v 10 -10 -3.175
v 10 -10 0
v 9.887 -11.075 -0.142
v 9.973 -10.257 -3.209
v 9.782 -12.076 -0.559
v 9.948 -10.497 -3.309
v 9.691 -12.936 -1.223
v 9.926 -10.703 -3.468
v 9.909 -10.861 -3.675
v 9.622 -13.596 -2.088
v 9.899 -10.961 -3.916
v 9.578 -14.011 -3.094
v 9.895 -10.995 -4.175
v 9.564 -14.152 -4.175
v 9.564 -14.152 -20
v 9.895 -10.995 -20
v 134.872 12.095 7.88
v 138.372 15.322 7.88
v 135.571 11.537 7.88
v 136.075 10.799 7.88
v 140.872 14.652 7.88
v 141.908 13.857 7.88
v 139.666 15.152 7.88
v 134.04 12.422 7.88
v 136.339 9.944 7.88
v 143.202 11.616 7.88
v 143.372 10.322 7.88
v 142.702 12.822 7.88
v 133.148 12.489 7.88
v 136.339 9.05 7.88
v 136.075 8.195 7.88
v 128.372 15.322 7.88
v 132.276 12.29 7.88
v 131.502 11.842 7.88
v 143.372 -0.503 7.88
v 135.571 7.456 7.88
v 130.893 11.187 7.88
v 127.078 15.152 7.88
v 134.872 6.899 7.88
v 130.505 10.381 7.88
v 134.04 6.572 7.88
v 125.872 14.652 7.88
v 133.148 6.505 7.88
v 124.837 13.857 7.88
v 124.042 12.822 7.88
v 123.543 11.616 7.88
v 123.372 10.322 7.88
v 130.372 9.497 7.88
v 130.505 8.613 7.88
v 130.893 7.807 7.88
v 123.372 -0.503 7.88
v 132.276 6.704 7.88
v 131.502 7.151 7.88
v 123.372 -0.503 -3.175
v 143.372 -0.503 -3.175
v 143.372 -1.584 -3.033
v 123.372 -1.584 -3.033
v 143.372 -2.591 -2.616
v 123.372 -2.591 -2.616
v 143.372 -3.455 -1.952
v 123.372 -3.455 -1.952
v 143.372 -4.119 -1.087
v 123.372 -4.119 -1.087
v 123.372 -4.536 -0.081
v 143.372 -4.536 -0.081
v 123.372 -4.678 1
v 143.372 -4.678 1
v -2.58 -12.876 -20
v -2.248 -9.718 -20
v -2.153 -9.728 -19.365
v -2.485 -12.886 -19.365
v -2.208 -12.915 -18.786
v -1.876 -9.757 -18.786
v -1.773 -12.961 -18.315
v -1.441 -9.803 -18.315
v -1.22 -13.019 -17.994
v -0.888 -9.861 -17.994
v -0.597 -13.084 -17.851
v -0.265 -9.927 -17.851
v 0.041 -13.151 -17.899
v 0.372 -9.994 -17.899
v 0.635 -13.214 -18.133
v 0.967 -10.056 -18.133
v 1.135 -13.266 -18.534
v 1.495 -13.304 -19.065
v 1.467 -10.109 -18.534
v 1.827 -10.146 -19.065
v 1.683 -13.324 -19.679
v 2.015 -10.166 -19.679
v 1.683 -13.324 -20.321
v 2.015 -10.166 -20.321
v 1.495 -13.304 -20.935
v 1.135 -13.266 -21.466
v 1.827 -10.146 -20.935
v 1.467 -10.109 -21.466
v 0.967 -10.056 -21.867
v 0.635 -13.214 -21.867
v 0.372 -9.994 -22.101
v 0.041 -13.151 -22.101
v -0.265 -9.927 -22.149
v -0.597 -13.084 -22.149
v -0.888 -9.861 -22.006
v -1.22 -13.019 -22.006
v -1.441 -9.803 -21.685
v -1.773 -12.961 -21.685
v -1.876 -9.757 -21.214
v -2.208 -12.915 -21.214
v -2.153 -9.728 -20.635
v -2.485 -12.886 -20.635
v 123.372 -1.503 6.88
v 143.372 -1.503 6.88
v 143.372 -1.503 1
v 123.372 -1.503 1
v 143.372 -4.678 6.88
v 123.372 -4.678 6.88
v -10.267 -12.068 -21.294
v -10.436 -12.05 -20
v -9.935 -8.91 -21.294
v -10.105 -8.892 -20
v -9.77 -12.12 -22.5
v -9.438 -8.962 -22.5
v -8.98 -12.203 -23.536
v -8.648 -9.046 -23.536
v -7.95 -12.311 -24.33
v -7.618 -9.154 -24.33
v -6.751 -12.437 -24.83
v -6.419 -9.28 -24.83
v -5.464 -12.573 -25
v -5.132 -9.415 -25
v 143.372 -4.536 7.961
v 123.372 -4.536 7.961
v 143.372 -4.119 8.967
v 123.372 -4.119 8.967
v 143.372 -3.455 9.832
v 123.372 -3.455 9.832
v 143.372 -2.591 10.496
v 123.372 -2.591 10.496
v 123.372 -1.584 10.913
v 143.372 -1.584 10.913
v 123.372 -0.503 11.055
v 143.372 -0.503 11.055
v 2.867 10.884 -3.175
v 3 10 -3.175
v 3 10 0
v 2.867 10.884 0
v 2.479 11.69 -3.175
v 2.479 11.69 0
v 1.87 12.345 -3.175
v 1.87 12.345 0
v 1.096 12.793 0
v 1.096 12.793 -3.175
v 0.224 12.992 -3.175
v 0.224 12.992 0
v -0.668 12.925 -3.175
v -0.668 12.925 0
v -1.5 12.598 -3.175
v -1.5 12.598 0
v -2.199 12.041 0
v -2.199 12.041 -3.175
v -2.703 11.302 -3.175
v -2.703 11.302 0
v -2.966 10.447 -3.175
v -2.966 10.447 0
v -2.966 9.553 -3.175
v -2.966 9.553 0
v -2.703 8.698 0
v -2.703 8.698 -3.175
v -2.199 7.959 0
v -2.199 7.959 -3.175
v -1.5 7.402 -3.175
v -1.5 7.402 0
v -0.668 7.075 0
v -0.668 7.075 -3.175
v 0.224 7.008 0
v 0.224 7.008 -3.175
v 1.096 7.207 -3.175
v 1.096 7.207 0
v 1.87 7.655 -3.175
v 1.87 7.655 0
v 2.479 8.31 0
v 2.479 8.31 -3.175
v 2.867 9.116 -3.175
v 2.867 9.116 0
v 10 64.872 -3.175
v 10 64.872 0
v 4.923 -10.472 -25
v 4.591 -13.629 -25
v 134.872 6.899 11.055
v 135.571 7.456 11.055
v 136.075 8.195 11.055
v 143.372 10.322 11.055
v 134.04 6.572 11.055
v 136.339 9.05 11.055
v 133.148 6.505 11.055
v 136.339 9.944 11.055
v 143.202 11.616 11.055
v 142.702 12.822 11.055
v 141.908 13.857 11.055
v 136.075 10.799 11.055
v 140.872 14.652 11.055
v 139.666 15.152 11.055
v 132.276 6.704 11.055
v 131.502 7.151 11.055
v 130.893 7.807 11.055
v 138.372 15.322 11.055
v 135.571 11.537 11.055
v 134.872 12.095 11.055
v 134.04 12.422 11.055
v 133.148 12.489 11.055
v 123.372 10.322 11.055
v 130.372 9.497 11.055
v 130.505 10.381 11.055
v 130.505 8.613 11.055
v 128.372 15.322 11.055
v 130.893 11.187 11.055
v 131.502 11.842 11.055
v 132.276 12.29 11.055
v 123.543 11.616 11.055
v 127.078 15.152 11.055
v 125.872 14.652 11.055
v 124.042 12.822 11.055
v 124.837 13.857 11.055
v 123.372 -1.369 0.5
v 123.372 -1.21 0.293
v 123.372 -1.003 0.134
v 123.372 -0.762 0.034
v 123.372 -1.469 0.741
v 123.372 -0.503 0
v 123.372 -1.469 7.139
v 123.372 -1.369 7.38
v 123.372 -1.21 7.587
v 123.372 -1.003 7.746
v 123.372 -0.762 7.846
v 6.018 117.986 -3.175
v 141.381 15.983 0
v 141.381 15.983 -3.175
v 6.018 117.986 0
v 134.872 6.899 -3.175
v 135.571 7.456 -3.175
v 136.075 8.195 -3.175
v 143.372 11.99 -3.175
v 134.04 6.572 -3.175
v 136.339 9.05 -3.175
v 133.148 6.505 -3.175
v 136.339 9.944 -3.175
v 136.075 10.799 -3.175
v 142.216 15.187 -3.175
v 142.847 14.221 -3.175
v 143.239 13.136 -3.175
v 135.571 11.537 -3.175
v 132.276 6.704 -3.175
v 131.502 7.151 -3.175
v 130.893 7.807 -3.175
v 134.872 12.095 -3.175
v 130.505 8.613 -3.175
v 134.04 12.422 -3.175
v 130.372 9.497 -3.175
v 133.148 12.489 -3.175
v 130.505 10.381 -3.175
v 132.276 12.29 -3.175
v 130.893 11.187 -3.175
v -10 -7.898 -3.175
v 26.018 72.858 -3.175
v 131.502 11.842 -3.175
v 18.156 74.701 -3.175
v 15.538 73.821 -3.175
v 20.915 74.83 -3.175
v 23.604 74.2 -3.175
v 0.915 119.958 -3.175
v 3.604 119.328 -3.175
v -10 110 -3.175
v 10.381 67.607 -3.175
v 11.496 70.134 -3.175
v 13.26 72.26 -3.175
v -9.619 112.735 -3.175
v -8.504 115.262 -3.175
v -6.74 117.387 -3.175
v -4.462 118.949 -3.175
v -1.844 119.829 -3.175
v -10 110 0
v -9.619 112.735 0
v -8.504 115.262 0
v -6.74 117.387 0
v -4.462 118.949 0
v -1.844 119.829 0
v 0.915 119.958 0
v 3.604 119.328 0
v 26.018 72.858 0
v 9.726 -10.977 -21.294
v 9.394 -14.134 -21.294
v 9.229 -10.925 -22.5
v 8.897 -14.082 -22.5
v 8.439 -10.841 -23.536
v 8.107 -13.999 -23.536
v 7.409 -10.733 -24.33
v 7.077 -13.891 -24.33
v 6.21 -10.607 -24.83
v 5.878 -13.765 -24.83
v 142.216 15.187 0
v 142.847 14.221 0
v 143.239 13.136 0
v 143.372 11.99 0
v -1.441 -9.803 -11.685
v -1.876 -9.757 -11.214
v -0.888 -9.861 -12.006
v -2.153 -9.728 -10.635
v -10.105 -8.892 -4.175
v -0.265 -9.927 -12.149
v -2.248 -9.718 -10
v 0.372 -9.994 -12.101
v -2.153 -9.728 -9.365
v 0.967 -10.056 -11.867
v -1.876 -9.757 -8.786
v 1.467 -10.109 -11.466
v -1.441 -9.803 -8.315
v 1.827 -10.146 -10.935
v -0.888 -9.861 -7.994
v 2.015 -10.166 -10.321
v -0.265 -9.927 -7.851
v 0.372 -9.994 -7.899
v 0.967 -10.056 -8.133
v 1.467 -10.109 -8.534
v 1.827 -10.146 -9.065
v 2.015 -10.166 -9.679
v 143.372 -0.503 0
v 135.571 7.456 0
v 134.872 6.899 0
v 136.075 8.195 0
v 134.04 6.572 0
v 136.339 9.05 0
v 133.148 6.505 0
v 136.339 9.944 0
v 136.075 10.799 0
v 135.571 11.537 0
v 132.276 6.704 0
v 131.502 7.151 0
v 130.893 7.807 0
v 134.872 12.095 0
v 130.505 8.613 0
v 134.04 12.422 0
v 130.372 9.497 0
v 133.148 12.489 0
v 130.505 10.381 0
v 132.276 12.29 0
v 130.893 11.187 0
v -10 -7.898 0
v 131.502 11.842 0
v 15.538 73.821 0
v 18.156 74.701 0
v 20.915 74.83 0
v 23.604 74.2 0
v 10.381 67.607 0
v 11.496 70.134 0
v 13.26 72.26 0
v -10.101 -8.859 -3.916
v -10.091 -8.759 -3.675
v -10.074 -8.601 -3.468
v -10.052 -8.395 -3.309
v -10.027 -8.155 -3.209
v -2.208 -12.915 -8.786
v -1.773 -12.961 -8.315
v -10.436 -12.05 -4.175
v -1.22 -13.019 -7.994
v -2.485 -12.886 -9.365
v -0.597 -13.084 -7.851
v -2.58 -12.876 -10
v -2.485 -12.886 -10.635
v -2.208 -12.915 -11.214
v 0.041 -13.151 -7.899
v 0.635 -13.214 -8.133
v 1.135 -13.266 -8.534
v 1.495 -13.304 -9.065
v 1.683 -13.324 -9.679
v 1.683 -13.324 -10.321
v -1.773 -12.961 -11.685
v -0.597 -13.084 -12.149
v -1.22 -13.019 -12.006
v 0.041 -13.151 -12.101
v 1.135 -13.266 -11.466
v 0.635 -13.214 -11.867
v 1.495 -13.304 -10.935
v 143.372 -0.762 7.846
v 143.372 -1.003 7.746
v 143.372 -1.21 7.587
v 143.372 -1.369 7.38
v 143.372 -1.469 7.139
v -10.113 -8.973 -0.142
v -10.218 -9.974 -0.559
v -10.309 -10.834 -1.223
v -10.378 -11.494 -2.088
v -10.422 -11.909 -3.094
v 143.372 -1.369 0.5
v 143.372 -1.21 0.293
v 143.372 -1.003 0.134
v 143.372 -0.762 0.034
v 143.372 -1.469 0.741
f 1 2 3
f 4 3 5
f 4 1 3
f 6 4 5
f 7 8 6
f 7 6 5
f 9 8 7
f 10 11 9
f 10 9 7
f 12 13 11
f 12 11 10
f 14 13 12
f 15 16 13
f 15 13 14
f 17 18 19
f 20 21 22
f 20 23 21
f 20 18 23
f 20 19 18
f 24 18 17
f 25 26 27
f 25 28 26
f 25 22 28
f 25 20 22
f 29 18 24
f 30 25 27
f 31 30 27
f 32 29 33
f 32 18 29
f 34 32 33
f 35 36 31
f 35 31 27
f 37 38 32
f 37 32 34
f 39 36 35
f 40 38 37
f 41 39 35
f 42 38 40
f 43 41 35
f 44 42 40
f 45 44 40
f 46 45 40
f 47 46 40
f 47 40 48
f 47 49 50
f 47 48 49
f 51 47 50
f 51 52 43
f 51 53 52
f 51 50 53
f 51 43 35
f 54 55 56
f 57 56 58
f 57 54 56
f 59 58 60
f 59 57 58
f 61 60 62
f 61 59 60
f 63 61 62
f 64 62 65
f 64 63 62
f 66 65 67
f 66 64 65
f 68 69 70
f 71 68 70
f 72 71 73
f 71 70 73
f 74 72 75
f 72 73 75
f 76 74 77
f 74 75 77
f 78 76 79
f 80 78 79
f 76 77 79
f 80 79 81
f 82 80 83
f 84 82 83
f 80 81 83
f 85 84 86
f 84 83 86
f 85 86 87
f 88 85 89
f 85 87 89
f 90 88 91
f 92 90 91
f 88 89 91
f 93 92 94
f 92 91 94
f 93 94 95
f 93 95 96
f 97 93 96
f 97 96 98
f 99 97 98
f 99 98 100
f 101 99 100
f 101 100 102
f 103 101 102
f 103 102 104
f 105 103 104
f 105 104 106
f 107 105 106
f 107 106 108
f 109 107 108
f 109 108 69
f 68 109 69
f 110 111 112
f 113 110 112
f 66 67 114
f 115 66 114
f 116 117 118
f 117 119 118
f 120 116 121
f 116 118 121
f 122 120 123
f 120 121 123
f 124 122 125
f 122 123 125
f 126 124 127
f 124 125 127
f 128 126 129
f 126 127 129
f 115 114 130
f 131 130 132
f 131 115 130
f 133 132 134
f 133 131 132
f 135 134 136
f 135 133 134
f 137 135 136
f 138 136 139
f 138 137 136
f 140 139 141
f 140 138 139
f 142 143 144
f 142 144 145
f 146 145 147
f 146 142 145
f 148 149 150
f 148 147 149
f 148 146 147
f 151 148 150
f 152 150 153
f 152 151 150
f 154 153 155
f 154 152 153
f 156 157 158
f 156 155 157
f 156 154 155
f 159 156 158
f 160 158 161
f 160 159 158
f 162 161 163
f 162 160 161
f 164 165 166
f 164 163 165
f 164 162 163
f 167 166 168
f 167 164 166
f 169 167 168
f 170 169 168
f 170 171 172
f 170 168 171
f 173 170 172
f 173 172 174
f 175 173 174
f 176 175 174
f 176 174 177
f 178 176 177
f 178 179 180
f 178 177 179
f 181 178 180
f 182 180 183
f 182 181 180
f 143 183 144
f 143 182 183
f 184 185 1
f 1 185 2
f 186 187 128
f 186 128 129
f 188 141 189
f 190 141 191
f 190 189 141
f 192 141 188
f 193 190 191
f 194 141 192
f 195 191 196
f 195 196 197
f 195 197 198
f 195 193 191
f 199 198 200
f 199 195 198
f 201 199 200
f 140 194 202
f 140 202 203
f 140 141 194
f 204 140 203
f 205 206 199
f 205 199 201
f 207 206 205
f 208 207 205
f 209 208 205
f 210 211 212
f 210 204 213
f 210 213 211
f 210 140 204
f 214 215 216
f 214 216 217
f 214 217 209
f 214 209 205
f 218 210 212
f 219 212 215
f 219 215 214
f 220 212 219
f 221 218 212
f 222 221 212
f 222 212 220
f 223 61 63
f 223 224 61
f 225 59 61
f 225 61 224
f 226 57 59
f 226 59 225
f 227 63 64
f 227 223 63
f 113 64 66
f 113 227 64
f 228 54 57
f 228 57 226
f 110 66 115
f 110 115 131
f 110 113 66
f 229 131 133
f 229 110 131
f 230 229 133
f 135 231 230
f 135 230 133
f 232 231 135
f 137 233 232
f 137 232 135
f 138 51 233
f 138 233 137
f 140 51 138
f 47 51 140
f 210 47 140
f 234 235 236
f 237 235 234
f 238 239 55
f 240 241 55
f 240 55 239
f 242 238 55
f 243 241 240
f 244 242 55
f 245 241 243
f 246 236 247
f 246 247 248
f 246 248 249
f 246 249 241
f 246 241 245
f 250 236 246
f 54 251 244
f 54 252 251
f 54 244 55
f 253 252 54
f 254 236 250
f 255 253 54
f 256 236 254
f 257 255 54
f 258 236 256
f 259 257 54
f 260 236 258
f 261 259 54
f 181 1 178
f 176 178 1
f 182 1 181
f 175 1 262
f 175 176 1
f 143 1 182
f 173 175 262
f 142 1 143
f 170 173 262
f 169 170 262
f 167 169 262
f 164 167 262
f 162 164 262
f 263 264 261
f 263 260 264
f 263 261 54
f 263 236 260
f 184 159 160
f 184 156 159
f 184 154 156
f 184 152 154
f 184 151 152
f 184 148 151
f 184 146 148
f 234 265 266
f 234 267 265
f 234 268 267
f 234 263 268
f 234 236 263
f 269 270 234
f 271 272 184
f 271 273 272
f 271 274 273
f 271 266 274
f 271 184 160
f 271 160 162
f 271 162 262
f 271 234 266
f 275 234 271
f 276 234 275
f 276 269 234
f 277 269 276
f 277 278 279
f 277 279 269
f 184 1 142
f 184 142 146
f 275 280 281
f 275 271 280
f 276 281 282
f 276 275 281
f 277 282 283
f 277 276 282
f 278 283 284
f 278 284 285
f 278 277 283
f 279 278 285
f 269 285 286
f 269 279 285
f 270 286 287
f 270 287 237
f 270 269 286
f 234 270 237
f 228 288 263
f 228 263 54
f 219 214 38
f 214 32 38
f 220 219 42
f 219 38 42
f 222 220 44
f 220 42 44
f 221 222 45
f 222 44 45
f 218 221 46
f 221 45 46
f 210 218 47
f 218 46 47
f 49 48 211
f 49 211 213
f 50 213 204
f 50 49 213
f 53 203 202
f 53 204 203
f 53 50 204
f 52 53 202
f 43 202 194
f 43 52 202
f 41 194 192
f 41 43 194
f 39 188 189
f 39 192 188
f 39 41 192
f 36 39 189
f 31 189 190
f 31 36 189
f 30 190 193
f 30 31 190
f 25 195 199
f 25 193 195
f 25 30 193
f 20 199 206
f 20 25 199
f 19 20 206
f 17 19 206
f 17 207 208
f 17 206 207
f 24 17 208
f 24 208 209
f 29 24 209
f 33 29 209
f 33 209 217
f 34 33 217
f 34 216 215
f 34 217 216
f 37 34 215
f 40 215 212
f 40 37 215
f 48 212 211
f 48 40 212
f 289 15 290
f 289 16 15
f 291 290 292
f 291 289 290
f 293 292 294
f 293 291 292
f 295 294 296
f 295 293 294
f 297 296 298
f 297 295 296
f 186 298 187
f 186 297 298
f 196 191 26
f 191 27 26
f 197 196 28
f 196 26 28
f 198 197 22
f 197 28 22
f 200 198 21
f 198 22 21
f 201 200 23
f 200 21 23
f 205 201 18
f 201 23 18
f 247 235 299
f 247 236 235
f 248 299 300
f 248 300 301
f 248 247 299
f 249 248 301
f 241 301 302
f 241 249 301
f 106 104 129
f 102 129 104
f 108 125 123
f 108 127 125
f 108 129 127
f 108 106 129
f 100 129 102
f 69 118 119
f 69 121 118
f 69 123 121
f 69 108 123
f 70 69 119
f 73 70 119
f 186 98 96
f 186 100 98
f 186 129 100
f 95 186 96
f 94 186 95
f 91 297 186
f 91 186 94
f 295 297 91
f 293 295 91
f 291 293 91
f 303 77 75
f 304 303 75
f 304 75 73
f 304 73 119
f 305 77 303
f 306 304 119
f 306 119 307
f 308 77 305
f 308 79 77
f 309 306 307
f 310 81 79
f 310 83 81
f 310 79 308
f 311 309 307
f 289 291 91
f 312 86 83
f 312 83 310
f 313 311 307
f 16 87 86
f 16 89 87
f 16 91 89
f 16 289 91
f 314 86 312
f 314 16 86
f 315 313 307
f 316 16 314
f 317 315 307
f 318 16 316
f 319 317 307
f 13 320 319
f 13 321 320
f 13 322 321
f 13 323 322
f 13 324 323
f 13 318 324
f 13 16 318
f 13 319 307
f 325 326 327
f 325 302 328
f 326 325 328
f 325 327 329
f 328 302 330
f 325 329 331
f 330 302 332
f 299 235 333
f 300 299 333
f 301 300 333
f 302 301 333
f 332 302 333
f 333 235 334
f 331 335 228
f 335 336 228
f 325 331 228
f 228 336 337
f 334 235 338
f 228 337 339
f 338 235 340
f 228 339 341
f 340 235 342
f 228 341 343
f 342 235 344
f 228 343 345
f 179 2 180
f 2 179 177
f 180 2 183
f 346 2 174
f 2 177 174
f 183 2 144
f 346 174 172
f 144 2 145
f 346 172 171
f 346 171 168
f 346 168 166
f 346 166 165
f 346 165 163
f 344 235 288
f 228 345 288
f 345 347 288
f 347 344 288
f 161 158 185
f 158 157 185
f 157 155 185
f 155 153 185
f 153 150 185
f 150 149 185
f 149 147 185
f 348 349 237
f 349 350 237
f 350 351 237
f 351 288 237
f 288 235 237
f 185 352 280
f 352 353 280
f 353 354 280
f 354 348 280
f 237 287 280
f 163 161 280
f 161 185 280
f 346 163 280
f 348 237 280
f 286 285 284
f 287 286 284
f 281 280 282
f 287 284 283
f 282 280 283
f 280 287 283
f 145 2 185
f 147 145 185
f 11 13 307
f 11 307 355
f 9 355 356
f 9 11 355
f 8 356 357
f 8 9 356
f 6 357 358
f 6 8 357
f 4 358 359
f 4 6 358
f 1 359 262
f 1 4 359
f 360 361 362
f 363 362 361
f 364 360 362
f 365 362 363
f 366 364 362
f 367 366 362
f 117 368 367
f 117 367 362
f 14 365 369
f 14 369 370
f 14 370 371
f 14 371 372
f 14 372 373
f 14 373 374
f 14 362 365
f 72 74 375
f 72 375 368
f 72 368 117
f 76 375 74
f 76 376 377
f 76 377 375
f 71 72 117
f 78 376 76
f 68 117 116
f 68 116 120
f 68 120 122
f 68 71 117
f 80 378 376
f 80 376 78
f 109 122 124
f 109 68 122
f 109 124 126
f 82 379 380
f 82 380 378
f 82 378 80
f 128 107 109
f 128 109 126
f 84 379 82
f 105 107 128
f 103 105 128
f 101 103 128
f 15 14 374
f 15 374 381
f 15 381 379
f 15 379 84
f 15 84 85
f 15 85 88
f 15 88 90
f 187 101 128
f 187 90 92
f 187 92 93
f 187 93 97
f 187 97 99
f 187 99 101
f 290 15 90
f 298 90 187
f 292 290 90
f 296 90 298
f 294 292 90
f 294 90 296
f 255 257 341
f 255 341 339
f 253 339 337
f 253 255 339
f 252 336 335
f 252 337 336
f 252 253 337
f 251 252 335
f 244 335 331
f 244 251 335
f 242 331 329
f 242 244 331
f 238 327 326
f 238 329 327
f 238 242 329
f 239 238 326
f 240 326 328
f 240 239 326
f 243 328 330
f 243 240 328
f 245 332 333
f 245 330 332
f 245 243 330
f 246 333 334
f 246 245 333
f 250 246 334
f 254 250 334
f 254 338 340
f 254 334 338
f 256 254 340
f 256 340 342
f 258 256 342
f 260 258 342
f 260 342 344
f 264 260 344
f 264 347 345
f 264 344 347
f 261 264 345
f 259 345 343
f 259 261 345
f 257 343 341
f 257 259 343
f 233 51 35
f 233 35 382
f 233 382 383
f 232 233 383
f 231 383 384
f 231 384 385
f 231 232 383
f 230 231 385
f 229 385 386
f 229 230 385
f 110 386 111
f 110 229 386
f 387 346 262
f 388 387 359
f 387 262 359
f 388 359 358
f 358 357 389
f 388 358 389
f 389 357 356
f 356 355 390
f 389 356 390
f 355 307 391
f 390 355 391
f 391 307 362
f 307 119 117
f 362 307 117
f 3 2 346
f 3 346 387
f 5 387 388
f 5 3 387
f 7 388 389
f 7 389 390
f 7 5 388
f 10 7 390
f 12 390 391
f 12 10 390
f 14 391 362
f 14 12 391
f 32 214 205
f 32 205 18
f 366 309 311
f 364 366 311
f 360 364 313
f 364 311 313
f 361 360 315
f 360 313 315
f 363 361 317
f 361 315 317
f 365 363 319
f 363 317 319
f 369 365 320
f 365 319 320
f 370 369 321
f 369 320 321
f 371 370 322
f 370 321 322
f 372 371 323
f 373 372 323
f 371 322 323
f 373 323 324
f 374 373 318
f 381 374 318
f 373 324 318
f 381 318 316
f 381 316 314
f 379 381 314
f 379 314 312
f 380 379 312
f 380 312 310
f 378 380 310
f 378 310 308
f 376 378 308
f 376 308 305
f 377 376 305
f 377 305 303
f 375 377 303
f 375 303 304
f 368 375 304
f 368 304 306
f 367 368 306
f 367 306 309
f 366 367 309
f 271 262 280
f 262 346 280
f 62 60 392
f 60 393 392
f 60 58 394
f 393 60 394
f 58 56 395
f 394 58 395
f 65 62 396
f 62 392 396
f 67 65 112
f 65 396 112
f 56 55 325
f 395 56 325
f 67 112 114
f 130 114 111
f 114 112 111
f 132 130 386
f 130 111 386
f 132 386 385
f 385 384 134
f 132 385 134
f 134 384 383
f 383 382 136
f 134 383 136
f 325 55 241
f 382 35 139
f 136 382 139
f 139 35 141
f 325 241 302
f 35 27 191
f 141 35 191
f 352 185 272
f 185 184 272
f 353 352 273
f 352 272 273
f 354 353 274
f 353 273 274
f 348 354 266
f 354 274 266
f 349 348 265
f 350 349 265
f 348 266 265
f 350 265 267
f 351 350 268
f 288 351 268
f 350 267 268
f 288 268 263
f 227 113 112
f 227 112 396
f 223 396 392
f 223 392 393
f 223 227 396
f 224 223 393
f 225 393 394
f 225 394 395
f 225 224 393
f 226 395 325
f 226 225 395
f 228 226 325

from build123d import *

# Parameters (mm, degrees)
BASE_FLANGE1_DEPTH           = 3.175
EDGE_FLANGE3_DEPTH           = 20
EDGE_FLANGE4_STRIP_W         = 14.7
EDGE_FLANGE4_STRIP_H         = 3.175
EDGE_FLANGE4_STRIP_CUT_DEPTH = 20
EDGE_FLANGE4_DEPTH           = 20
CUT_EXTRUDE1_DEPTH           = 194.888053308
CUT_EXTRUDE1_DEPTH_BACK      = 194.888053308
SKETCH12_R                   = 3
TAB1_DEPTH                   = 3.175
EDGE_FLANGE5_DEPTH           = 20.110165591
FILLET1_R                    = 10
FILLET2_R                    = 5
SKETCH27_R                   = 2.155423697
CUT_EXTRUDE2_DEPTH           = 196.8016212


# Sheet-metal steps are written as plain solids
with BuildPart() as part:
    # Sketch1 → Base-Flange1 (new body)
    with BuildSketch(Plane.XY):
        Polygon((10, 0), (10, 84.928918998), (123.372130178, -0.503108866), (143.372130178, -0.503108866), (143.372130178, 14.482707214), (-10, 130.056897083), (-10, 0), align=None)
    extrude(amount=-BASE_FLANGE1_DEPTH)

    # Edge-Flange3 section (across the edge) → Edge-Flange3 (add)
    with BuildSketch(Plane(origin=(123.372130178, -1.503108866, 0), x_dir=(0, 1, 0), z_dir=(1, 0, 0))):
        with BuildLine():
            Line((-3.175, 1), (-3.175, 11.055))
            Line((-3.175, 11.055), (0, 11.055))
            Line((0, 11.055), (0, 1))
            ThreePointArc((0, 1), (0.292893219, 0.292893219), (1, 0))
            Line((1, 0), (1, -3.175))
            ThreePointArc((1, -3.175), (-1.952170811, -1.952170811), (-3.175, 1))
        make_face()
    extrude(amount=EDGE_FLANGE3_DEPTH)

    # Edge-Flange4 strip (across the edge) → Edge-Flange4 strip cut (cut)
    with BuildSketch(Plane(origin=(123.372130178, -1.503108866, 11.055), x_dir=(0, 0, -1), z_dir=(1, 0, 0))):
        with Locations((-3.175, -1.5875)):
            Rectangle(EDGE_FLANGE4_STRIP_W, EDGE_FLANGE4_STRIP_H)
    extrude(amount=EDGE_FLANGE4_STRIP_CUT_DEPTH, mode=Mode.SUBTRACT)

    # Edge-Flange4 section (across the edge) → Edge-Flange4 (add)
    with BuildSketch(Plane(origin=(123.372130178, -1.503108866, 11.055), x_dir=(0, 0, -1), z_dir=(1, 0, 0))):
        with BuildLine():
            Line((0, 1), (0, 16.825))
            Line((0, 16.825), (3.175, 16.825))
            Line((3.175, 16.825), (3.175, 1))
            ThreePointArc((3.175, 1), (3.467893219, 0.292893219), (4.175, 0))
            Line((4.175, 0), (4.175, -3.175))
            ThreePointArc((4.175, -3.175), (1.222829189, -1.952170811), (0, 1))
        make_face()
    extrude(amount=EDGE_FLANGE4_DEPTH)

    # Sketch12 → Cut-Extrude1 (cut, two sides: drawn at the far end of the back side and taken through both)
    with BuildSketch(Plane.XY.offset(-CUT_EXTRUDE1_DEPTH_BACK)):
        with Locations(Location((133.372130178, 9.496891134, 0), (0, 0, 180))):
            Circle(SKETCH12_R)
        with Locations((0, 10)):
            Circle(SKETCH12_R)
    extrude(amount=CUT_EXTRUDE1_DEPTH + CUT_EXTRUDE1_DEPTH_BACK, mode=Mode.SUBTRACT)

    # Sketch19 → Tab1 (add)
    with BuildSketch(Plane.XY):
        Polygon((-10, 0), (10, 0), (10, -10), (-10, -7.897915295), align=None)
    extrude(amount=-TAB1_DEPTH)

    # Edge-Flange5 section (across the edge) → Edge-Flange5 (add)
    with BuildSketch(Plane(origin=(9.895471537, -10.994521895, -3.175), x_dir=(0.10452846326765029, 0.9945218953682737, -3.4914813388431334e-15), z_dir=(-0.9945218953682737, 0.10452846326765029, 0))):
        with BuildLine():
            Line((-3.175, 1), (-3.175, 21.825))
            Line((-3.175, 21.825), (0, 21.825))
            Line((0, 21.825), (0, 1))
            ThreePointArc((0, 1), (0.292893219, 0.292893219), (1, 0))
            Line((1, 0), (1, -3.175))
            ThreePointArc((1, -3.175), (-1.952170811, -1.952170811), (-3.175, 1))
        make_face()
    extrude(amount=EDGE_FLANGE5_DEPTH)

    # Fillet1
    fillet1_edges = [part.edges().sort_by_distance(p)[0] for p in [
        (-10, 130.056897083, -1.5875),
        (10, 84.928918998, -1.5875),
    ]]
    fillet(fillet1_edges, radius=FILLET1_R)

    # Fillet2
    fillet2_edges = [part.edges().sort_by_distance(p)[0] for p in [
        (9.729532601, -12.573325404, -25),
        (-10.270467399, -10.471240699, -25),
        (143.372130178, 14.482707214, -1.5875),
        (123.372130178, 15.321891134, 9.4675),
        (143.372130178, 15.321891134, 9.4675),
    ]]
    fillet(fillet2_edges, radius=FILLET2_R)

    # Sketch27 → Cut-Extrude2 (cut, through all)
    with BuildSketch(Plane(origin=(-1.034824921, -9.845701445, 0), x_dir=(0.9945218953682736, -0.10452846326765024, 0), z_dir=(0.10452846326765025, 0.9945218953682737, -3.503032532656101e-15))):
        with Locations(Location((0.935420791, 20, 0), (0, 0, 180))):
            Circle(SKETCH27_R)
        with Locations(Location((0.935420791, 10, 0), (0, 0, 180))):
            Circle(SKETCH27_R)
    extrude(amount=-CUT_EXTRUDE2_DEPTH, mode=Mode.SUBTRACT)


solid = part.part
